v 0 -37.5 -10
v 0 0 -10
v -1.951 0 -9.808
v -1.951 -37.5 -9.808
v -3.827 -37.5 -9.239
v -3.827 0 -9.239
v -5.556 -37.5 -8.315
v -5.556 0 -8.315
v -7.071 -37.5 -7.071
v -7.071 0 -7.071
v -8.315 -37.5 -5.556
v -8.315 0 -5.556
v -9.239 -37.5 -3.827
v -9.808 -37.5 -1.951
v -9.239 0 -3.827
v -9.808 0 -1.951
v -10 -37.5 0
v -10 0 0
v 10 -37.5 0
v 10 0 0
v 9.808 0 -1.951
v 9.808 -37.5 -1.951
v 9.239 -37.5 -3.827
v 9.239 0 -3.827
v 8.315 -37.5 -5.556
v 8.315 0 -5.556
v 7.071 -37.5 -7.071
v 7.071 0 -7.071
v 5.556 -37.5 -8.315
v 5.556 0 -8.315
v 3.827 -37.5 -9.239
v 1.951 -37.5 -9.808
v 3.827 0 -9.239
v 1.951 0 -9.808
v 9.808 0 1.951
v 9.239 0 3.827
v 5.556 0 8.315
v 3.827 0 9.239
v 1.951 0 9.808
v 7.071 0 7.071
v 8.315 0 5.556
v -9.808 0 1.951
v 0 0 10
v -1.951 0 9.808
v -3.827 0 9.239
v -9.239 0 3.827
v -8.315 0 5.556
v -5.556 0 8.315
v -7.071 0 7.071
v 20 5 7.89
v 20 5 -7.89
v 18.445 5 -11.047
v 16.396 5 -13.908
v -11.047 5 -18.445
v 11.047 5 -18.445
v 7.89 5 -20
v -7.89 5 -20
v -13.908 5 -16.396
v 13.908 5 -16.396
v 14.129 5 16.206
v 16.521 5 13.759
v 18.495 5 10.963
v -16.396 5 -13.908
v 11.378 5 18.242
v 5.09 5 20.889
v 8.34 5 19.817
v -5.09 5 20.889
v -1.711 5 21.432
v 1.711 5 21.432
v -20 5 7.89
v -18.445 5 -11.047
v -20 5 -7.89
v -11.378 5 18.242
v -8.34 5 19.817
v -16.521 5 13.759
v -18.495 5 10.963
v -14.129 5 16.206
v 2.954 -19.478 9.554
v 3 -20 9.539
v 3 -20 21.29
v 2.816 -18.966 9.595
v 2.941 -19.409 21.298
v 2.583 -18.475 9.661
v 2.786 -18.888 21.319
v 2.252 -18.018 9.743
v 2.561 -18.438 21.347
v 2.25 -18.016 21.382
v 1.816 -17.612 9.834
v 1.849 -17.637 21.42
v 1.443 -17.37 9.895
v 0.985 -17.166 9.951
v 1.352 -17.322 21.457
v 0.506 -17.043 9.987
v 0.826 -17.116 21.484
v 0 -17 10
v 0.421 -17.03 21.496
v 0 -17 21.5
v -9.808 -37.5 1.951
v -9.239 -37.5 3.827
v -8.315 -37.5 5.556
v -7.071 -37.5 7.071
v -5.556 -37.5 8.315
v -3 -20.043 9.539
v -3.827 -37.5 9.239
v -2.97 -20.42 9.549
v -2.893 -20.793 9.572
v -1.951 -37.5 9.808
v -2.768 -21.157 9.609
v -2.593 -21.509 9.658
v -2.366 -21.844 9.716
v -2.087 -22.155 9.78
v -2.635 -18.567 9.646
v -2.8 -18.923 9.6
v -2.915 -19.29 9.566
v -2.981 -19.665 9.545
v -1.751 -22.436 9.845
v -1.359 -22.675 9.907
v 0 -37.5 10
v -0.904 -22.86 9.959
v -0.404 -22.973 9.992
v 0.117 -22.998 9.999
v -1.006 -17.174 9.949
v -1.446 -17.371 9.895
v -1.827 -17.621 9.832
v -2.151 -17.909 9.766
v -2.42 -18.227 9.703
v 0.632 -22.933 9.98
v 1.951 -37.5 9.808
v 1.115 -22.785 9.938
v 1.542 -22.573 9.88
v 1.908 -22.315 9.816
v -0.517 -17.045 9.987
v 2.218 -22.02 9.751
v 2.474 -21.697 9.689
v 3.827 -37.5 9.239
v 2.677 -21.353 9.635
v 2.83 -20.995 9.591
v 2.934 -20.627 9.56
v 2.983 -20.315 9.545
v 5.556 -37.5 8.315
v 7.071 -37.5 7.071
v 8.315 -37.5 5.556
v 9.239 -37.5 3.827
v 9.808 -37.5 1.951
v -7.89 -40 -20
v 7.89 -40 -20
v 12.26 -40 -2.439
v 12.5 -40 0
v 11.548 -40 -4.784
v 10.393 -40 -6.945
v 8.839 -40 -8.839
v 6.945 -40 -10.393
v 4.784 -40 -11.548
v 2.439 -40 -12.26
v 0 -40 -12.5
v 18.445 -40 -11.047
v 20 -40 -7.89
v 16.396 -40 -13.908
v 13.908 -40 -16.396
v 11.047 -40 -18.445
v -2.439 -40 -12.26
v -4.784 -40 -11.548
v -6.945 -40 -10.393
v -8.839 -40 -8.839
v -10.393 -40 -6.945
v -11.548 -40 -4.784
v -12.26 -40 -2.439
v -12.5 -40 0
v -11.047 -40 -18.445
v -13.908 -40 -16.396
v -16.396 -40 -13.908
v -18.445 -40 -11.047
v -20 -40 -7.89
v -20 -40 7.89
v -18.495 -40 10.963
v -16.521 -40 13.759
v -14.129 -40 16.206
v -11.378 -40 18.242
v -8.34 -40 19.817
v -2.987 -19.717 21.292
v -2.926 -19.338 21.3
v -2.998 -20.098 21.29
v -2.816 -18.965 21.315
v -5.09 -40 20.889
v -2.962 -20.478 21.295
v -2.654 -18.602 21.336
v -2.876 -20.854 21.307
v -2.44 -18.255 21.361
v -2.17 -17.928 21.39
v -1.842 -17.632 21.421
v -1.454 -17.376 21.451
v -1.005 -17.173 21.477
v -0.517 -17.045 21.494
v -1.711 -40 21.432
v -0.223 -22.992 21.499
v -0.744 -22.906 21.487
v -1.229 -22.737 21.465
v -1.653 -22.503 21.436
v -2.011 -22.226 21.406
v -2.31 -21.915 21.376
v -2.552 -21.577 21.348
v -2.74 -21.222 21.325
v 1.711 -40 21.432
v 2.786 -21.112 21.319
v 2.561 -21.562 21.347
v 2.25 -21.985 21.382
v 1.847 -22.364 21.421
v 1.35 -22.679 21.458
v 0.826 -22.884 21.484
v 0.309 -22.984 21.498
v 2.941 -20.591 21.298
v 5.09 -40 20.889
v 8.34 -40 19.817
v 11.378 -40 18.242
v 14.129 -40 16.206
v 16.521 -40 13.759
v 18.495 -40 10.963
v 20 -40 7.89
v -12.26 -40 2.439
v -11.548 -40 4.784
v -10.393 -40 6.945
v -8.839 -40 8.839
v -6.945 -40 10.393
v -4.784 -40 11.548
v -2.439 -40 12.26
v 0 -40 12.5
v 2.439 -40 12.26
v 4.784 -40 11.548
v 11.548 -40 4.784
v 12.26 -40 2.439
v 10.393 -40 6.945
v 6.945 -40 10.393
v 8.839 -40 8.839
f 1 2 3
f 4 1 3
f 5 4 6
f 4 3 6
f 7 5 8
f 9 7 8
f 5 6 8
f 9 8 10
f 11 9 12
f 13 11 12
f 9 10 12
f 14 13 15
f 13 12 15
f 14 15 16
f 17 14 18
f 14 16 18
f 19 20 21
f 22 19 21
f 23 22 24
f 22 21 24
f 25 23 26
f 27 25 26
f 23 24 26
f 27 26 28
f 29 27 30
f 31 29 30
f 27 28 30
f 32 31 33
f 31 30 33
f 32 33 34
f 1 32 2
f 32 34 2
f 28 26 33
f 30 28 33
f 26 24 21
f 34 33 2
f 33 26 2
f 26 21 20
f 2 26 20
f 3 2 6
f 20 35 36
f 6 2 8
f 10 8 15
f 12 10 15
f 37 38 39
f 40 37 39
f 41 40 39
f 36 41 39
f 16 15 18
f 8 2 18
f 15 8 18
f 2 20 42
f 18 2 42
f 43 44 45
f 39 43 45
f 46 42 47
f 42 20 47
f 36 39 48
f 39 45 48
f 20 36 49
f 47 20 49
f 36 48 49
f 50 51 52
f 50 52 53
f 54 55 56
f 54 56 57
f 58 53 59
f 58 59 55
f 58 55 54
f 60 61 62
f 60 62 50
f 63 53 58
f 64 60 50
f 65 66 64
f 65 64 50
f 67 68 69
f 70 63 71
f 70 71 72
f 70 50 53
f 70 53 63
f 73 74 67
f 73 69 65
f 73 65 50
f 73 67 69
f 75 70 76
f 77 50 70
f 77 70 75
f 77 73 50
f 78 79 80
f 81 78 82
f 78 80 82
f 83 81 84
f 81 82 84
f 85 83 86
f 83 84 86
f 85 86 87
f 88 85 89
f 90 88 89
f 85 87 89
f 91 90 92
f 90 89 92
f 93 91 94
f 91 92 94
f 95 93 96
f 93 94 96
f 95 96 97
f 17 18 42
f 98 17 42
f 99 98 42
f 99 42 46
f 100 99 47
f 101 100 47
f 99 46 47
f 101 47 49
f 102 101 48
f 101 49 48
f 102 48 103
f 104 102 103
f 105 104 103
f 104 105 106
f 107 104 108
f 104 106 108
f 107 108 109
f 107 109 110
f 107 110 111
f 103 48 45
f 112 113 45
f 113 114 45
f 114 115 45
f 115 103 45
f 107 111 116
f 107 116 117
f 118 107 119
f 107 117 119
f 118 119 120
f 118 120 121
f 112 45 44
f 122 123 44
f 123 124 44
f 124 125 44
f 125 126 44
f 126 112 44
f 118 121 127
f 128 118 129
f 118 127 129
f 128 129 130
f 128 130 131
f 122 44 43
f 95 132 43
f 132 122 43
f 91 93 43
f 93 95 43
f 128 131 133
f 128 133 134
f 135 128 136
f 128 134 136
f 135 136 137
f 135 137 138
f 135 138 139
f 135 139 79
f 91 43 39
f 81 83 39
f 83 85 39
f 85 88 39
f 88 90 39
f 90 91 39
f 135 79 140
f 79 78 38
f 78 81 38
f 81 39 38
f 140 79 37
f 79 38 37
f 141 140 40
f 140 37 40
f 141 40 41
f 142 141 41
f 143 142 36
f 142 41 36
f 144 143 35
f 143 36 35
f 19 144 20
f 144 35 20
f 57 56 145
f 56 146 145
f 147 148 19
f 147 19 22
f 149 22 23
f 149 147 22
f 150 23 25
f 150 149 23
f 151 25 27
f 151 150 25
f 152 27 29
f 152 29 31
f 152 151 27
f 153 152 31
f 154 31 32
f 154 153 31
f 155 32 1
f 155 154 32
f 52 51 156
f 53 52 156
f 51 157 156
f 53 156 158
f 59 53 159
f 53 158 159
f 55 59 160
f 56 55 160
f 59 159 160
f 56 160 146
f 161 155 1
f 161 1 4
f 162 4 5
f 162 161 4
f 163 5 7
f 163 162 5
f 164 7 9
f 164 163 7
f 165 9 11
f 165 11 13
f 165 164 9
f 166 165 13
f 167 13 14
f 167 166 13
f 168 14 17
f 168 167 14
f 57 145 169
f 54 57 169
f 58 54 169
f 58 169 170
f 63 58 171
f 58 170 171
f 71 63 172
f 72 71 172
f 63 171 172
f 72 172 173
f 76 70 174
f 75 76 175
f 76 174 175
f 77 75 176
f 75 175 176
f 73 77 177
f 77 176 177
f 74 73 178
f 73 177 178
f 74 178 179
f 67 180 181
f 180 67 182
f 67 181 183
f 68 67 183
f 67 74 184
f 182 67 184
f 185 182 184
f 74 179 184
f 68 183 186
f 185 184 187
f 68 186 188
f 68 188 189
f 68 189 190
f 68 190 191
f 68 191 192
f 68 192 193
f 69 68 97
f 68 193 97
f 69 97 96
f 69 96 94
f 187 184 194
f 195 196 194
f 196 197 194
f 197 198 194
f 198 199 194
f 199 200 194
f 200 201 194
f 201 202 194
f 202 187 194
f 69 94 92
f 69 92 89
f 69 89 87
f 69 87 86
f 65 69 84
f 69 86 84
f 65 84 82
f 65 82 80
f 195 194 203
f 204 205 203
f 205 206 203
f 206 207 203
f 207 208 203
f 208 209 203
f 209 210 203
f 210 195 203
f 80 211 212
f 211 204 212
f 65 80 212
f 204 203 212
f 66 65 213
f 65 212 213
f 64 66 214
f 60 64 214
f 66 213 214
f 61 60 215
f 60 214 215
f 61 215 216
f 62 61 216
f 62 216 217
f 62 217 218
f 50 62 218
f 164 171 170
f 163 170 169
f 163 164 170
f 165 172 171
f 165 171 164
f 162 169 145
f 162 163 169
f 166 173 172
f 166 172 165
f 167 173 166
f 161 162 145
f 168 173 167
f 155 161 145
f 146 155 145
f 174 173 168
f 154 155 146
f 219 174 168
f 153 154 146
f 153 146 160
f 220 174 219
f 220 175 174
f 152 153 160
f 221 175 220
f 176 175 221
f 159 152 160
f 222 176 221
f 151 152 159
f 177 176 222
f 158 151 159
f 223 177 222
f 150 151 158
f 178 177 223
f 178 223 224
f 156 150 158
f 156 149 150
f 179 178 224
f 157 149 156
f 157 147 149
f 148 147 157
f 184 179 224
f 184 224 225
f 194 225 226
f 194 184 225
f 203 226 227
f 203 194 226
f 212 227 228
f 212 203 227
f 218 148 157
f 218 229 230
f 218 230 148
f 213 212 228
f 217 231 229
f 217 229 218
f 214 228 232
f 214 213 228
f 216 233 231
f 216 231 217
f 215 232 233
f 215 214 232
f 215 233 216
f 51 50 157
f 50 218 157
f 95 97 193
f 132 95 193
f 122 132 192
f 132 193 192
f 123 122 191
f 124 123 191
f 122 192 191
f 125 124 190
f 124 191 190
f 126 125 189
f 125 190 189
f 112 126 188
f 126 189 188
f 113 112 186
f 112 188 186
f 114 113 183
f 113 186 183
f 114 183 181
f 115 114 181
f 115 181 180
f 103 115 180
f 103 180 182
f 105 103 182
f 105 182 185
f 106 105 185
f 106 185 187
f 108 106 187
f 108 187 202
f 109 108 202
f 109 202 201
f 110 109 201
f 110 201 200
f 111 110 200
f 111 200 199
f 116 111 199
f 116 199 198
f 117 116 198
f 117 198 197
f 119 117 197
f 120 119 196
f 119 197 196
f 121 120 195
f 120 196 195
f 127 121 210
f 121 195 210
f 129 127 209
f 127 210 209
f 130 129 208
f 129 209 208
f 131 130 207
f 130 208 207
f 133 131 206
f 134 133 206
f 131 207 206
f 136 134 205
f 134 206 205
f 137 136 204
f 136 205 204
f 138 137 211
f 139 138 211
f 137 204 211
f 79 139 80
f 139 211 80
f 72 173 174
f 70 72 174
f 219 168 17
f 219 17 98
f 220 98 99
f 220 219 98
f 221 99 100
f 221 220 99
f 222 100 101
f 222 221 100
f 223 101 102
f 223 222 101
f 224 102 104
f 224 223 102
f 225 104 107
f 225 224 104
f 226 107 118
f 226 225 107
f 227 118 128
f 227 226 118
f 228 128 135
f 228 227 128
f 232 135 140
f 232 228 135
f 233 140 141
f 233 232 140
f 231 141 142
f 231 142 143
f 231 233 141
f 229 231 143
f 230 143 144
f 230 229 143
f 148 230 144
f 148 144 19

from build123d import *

# Parameters (mm, degrees)
F1_DEPTH = 40
F2_R     = 10
F3_DEPTH = 5
F6_DEPTH = 15
F7_SIZE  = 2.5


with BuildPart() as f1:
    # F0 (on Front) → F1 (new body)
    with BuildSketch(Plane.XZ):
        with BuildLine():
            Line((-20, 0), (-20, -7.889866919))
            ThreePointArc((-20, -7.889866919), (-15.2027957955, -15.2027957955), (-7.889866919, -20))
            Line((-7.889866919, -20), (0, -20))
            Line((0, -20), (0, -10))
            ThreePointArc((0, -10), (-7.0710678119, -7.0710678119), (-10, 0))
            Line((-10, 0), (-20, 0))
        make_face()
        with BuildLine():
            ThreePointArc((7.889866919, -20), (15.2027957955, -15.2027957955), (20, -7.889866919))
            Line((20, -7.889866919), (20, 0))
            Line((20, 0), (10, 0))
            ThreePointArc((10, 0), (7.0710678119, -7.0710678119), (0, -10))
            Line((0, -10), (0, -20))
            Line((0, -20), (7.889866919, -20))
        make_face()
        with BuildLine():
            Line((20, 0), (20, 7.889866919))
            ThreePointArc((20, 7.889866919), (0, 21.5), (-20, 7.889866919))
            Line((-20, 7.889866919), (-20, 0))
            Line((-20, 0), (-10, 0))
            ThreePointArc((-10, 0), (0, 10), (10, 0))
            Line((10, 0), (20, 0))
        make_face()
    extrude(amount=F1_DEPTH)

    # F2 (on face) → F3 (join)
    with BuildSketch(Plane(origin=(0, 0, 0), x_dir=(-1, 0, 0), z_dir=(0, 1, 0))):
        with BuildLine():
            ThreePointArc((20, 7.889866919), (0, 21.5), (-20, 7.889866919))
            Line((-20, 7.889866919), (-20, -7.889866919))
            ThreePointArc((-20, -7.889866919), (-15.2027957955, -15.2027957955), (-7.889866919, -20))
            Line((-7.889866919, -20), (7.889866919, -20))
            ThreePointArc((7.889866919, -20), (15.2027957955, -15.2027957955), (20, -7.889866919))
            Line((20, -7.889866919), (20, 7.889866919))
        make_face()
        Circle(F2_R, mode=Mode.SUBTRACT)
        Circle(F2_R)
    extrude(amount=F3_DEPTH)

    # F5 (on offset) → F6 (cut)
    with BuildSketch(Plane.XY.offset(21.5)):
        with BuildLine():
            ThreePointArc((0, -17), (-2.1213203436, -22.1213203436), (3, -20))
            ThreePointArc((3, -20), (2.1213203436, -17.8786796564), (0, -17))
        make_face()
    extrude(amount=-F6_DEPTH, mode=Mode.SUBTRACT)

    # F7
    f7_edges = [f1.edges().sort_by_distance(p)[0] for p in [
        (10, -40, 0),
    ]]
    chamfer(f7_edges, length=F7_SIZE)


solid = f1.part
